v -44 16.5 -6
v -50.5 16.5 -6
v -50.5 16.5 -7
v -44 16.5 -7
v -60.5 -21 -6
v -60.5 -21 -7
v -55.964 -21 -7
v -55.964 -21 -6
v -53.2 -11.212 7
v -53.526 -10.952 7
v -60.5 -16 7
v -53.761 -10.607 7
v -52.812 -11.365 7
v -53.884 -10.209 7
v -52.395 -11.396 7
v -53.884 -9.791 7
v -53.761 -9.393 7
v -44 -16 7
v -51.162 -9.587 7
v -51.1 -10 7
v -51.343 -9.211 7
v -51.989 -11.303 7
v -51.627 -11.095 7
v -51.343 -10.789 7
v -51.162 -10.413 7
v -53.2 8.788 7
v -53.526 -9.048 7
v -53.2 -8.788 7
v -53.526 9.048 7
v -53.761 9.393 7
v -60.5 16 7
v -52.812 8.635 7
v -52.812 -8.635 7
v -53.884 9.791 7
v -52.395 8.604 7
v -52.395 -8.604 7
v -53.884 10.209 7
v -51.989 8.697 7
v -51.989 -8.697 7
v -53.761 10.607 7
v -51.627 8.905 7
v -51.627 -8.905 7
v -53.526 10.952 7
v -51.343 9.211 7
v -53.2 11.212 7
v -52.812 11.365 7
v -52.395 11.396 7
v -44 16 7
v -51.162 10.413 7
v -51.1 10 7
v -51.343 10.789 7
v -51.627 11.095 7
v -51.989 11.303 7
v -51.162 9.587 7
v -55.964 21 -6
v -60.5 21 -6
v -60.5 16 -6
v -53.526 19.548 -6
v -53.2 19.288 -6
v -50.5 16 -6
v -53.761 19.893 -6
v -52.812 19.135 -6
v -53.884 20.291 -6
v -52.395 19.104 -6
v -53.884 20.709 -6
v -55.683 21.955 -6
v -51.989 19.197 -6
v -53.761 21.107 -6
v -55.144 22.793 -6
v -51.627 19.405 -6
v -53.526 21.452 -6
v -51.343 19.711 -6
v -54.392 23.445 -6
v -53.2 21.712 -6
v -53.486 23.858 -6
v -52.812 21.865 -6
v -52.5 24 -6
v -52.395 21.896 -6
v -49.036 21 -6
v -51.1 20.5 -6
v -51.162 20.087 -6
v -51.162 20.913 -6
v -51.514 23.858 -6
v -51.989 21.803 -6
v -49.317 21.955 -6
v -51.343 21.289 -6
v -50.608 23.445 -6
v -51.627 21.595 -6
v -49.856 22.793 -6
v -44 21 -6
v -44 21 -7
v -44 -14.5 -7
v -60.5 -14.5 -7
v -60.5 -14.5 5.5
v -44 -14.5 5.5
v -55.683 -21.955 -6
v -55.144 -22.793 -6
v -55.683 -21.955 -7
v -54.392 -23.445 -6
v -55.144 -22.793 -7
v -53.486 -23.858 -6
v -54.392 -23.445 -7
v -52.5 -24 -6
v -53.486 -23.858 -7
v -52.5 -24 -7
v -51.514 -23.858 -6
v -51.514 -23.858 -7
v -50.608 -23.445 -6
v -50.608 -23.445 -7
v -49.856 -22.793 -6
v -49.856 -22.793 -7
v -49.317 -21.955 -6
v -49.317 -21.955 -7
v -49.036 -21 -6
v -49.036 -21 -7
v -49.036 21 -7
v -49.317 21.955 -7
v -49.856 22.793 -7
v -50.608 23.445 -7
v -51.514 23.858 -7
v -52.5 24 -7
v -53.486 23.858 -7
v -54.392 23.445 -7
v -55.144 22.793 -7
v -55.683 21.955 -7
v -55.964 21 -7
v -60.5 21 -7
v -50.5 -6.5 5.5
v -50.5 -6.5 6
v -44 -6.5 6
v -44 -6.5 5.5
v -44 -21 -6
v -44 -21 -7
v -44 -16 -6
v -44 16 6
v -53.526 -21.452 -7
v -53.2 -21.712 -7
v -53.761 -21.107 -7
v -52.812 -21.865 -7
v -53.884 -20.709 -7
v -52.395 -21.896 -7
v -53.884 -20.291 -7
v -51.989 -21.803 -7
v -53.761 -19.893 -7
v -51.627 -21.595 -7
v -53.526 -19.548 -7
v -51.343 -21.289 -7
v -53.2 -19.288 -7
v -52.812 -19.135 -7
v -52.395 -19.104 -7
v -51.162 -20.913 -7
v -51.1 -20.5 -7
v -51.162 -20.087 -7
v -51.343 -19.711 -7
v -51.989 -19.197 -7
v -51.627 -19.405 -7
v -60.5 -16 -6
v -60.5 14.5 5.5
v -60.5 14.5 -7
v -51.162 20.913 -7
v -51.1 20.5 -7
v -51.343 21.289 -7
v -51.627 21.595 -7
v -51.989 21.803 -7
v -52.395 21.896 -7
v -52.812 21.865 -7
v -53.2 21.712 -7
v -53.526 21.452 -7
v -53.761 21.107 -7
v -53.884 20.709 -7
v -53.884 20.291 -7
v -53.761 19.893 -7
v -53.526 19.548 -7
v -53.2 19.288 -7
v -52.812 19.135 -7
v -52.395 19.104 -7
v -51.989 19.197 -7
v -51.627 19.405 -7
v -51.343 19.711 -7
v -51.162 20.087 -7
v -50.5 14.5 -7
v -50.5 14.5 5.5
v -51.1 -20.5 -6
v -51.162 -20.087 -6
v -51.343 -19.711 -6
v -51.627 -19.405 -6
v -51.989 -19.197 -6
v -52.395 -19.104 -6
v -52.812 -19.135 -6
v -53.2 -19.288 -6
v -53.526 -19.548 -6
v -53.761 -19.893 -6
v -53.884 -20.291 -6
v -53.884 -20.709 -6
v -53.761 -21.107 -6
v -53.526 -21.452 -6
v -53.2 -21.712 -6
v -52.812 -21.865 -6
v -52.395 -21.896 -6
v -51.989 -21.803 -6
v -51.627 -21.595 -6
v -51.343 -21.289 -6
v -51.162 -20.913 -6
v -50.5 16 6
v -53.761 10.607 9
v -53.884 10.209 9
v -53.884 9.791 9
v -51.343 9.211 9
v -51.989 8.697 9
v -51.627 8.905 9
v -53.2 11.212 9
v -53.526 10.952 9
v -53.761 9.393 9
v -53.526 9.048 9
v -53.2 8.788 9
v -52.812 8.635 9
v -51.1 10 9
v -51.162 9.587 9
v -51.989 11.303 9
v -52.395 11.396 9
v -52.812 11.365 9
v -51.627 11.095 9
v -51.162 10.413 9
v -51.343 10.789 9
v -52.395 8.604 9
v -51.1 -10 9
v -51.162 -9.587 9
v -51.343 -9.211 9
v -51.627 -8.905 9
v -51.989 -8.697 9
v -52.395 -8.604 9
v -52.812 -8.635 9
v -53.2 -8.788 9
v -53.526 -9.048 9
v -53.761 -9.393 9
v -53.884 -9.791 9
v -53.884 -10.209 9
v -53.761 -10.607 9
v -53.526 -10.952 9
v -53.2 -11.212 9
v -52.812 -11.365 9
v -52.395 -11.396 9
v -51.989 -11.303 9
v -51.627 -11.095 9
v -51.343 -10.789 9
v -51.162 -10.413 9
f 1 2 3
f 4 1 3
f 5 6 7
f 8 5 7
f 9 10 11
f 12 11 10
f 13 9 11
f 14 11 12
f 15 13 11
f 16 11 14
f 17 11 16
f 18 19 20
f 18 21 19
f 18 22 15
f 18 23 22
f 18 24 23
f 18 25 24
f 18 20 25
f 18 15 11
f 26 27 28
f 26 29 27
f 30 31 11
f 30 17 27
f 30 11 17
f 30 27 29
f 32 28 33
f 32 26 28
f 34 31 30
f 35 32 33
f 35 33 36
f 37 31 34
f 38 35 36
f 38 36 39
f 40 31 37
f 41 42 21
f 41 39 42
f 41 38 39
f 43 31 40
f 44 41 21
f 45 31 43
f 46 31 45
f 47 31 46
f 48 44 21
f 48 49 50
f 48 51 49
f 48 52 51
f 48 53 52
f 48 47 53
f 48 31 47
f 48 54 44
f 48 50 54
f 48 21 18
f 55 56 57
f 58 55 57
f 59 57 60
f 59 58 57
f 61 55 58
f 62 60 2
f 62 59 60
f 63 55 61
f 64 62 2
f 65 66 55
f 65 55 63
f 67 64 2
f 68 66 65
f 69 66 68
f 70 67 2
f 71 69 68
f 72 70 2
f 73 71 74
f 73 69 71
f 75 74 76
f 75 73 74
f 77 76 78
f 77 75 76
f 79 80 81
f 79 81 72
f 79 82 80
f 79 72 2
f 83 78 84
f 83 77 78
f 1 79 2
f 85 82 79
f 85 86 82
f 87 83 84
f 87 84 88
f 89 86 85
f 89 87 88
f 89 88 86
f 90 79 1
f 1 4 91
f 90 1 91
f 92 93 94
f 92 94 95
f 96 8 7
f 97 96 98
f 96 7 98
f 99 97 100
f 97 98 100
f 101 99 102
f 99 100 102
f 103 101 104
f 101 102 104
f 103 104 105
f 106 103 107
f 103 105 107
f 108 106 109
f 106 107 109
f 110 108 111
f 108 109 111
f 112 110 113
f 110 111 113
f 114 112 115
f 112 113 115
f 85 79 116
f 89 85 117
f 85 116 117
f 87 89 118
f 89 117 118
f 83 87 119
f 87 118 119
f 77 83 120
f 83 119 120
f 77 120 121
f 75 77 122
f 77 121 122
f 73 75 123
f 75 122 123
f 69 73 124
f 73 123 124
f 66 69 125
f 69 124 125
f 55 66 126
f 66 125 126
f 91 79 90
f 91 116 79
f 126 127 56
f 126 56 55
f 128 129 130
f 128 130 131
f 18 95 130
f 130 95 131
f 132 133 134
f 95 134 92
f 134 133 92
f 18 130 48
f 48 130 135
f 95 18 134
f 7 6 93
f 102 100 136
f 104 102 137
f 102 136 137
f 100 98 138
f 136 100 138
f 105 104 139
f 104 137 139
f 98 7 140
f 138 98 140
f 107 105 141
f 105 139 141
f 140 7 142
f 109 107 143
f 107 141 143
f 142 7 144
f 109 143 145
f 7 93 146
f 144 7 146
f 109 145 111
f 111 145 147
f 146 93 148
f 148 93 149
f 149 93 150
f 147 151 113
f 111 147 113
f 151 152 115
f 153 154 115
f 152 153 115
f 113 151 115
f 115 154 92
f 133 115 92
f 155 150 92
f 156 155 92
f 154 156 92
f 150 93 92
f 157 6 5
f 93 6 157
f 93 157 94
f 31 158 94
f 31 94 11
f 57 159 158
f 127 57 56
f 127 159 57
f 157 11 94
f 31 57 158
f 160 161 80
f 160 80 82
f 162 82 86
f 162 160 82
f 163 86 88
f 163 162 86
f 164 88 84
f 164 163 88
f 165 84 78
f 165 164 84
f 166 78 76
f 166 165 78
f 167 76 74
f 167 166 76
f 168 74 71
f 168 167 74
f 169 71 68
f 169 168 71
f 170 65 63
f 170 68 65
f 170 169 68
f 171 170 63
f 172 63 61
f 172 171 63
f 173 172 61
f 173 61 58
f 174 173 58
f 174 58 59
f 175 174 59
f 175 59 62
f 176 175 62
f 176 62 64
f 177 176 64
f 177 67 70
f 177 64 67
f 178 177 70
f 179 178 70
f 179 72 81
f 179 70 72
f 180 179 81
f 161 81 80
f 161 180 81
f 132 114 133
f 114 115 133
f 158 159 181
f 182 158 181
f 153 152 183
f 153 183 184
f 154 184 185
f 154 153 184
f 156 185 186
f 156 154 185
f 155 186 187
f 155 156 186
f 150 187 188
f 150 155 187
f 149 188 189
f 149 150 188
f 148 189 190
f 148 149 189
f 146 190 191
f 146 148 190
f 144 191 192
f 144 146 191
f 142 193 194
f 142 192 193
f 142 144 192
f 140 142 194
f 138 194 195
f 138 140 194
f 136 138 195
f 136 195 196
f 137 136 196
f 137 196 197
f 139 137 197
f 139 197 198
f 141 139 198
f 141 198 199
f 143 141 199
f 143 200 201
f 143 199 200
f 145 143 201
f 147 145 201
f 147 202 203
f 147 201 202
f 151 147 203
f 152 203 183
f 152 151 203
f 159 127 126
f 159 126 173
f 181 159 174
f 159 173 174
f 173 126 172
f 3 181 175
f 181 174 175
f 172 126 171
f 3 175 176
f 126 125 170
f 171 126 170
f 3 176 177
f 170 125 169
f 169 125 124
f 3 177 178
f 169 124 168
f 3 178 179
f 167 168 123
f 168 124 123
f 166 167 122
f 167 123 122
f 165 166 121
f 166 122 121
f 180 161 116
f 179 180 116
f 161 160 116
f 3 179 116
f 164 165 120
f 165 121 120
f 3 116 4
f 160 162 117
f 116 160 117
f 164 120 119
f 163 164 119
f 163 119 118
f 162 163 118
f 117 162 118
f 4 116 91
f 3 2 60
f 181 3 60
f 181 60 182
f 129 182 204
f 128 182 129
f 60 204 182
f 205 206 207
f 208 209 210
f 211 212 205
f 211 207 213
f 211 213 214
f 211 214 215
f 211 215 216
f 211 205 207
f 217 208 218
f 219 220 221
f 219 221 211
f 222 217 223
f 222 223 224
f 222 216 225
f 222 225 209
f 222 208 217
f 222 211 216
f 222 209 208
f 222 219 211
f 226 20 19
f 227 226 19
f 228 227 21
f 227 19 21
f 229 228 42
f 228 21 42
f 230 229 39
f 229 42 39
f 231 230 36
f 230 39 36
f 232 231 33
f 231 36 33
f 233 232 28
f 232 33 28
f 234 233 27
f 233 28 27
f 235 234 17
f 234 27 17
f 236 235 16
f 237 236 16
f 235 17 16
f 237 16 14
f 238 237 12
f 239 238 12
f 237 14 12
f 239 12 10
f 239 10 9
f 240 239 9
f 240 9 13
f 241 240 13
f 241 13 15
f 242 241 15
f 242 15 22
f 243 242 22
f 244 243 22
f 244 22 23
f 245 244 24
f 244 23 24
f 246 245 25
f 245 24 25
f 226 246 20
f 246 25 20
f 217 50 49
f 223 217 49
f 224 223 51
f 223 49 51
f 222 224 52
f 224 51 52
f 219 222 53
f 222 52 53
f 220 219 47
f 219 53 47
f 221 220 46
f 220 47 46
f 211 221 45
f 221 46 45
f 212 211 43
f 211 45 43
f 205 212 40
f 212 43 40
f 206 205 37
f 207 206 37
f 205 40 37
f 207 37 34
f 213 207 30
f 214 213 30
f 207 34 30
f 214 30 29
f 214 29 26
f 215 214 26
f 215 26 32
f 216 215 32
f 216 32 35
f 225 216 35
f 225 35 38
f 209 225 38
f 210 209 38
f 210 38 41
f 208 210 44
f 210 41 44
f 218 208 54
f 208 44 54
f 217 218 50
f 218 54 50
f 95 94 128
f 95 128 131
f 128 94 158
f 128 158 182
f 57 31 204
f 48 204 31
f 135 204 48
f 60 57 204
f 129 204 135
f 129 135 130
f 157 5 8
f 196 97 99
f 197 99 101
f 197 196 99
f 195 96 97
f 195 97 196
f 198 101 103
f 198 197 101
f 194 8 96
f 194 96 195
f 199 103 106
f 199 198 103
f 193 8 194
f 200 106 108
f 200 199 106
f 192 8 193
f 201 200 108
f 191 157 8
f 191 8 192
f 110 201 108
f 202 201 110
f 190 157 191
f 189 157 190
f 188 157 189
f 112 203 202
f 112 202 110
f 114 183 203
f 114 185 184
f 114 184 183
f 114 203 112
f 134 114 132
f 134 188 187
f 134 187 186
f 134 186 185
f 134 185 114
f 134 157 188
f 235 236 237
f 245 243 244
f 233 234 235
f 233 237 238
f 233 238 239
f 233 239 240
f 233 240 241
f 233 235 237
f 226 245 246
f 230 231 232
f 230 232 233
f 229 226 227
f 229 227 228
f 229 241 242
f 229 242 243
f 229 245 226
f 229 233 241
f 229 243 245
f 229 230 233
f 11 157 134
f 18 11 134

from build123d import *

# Parameters (mm, degrees)
CYLINDER100_R          = 1.5
CYLINDER100_DEPTH      = 10
CYLINDER103_R          = 1.5
CYLINDER103_DEPTH      = 5
CYLINDER104_R          = 1.5
CYLINDER104_DEPTH      = 10
CYLINDER102_R          = 3.5
CYLINDER102_DEPTH      = 5
BOX064_W               = 32
BOX064_H               = 13
BOX064_DEPTH           = 2
CYLINDER101_R          = 6.5
CYLINDER101_DEPTH      = 6
BOX063_W               = 23
BOX063_H               = 13
BOX063_DEPTH           = 24
CUT044_ROLL_ANGLE      = -90
CUT044_PLACEMENT_ANGLE = -90
CYLINDER086_R          = 1.4
CYLINDER086_DEPTH      = 4
BOX043_W               = 18
BOX043_H               = 29
BOX043_DEPTH           = 12.5
BOX044_W               = 18
BOX044_H               = 6
BOX044_DEPTH           = 17
BOX045_W               = 18
BOX045_H               = 6
BOX045_DEPTH           = 17
CYLINDER085_R          = 1.4
CYLINDER085_DEPTH      = 4
CYLINDER084_R          = 3.5
CYLINDER084_DEPTH      = 1
BOX042_W               = 16.5
BOX042_H               = 42
BOX042_DEPTH           = 14
CYLINDER021_R          = 1.4
CYLINDER021_DEPTH      = 2
CYLINDER022_R          = 1.4
CYLINDER022_DEPTH      = 2
BOX010_W               = 16
BOX010_H               = 32
BOX010_DEPTH           = 1
CYLINDER083_R          = 3.5
CYLINDER083_DEPTH      = 1


with BuildPart() as zylinder100:
    # Cylinder100 → Cylinder100 (new body)
    with BuildSketch(Plane(origin=(25.5, 6.5, 13), x_dir=(1, 0, 0), z_dir=(0, 0, 1))):
        Circle(CYLINDER100_R)
    extrude(amount=CYLINDER100_DEPTH)


with BuildPart() as zylinder103:
    # Cylinder103 → Cylinder103 (new body)
    with BuildSketch(Plane(origin=(16.5, 6.5, 30), x_dir=(1, 0, 0), z_dir=(0, 0, 1))):
        Circle(CYLINDER103_R)
    extrude(amount=CYLINDER103_DEPTH)


with BuildPart() as fusion061:
    # Cylinder104 → Cylinder104 (new body)
    with BuildSketch(Plane(origin=(-2.5, 6.5, 13), x_dir=(1, 0, 0), z_dir=(0, 0, 1))):
        Circle(CYLINDER104_R)
    extrude(amount=CYLINDER104_DEPTH)

    # Fusion061: union Zylinder100, Zylinder103
    add(zylinder100.part)
    add(zylinder103.part)


with BuildPart() as zylinder102:
    # Cylinder102 → Cylinder102 (new body)
    with BuildSketch(Plane(origin=(16.5, 6.5, 29), x_dir=(1, 0, 0), z_dir=(0, 0, 1))):
        Circle(CYLINDER102_R)
    extrude(amount=CYLINDER102_DEPTH)


with BuildPart() as w_rfel064:
    # Box064 → Box064 (new body)
    with BuildSketch(Plane(origin=(-4.5, 0, 18), x_dir=(1, 0, 0), z_dir=(0, 0, 1))):
        with Locations((16, 6.5)):
            Rectangle(BOX064_W, BOX064_H)
    extrude(amount=BOX064_DEPTH)


with BuildPart() as zylinder101:
    # Cylinder101 → Cylinder101 (new body)
    with BuildSketch(Plane(origin=(16.5, 6.5, 23), x_dir=(1, 0, 0), z_dir=(0, 0, 1))):
        Circle(CYLINDER101_R)
    extrude(amount=CYLINDER101_DEPTH)


with BuildPart() as servo3_mask001:
    # Box063 → Box063 (new body)
    with BuildSketch(Plane.XY.offset(-1)):
        with Locations((11.5, 6.5)):
            Rectangle(BOX063_W, BOX063_H)
    extrude(amount=BOX063_DEPTH)

    # Fusion060: union Zylinder102, Würfel064, Zylinder101
    add(zylinder102.part)
    add(w_rfel064.part)
    add(zylinder101.part)

    # Cut044: cut Fusion061
    add(fusion061.part, mode=Mode.SUBTRACT)


with BuildPart() as servo3_mask001_1:
    # Cut044 roll: moved
    add(servo3_mask001.part.rotate(Axis((0, 0, 0), (1, 0, 0)), CUT044_ROLL_ANGLE))


with BuildPart() as servo3_mask001_2:
    # Cut044 placement: moved
    add(servo3_mask001_1.part.moved(Location((-49.5, 16.5, 5))).rotate(Axis((-49.5, 16.5, 5), (0, 0, 1)), CUT044_PLACEMENT_ANGLE))


with BuildPart() as zylinder086:
    # Cylinder086 → Cylinder086 (new body)
    with BuildSketch(Plane(origin=(-52.5, 20.5, -9.5), x_dir=(1, 0, 0), z_dir=(0, 0, 1))):
        Circle(CYLINDER086_R)
    extrude(amount=CYLINDER086_DEPTH)


with BuildPart() as w_rfel043:
    # Box043 → Box043 (new body)
    with BuildSketch(Plane(origin=(-61.5, -14.5, -8), x_dir=(1, 0, 0), z_dir=(0, 0, 1))):
        with Locations((9, 14.5)):
            Rectangle(BOX043_W, BOX043_H)
    extrude(amount=BOX043_DEPTH)


with BuildPart() as w_rfel044:
    # Box044 → Box044 (new body)
    with BuildSketch(Plane(origin=(-61.5, -22, -7), x_dir=(1, 0, 0), z_dir=(0, 0, 1))):
        with Locations((9, 3)):
            Rectangle(BOX044_W, BOX044_H)
    extrude(amount=BOX044_DEPTH)


with BuildPart() as w_rfel045:
    # Box045 → Box045 (new body)
    with BuildSketch(Plane(origin=(-61.5, 16, -7), x_dir=(1, 0, 0), z_dir=(0, 0, 1))):
        with Locations((9, 3)):
            Rectangle(BOX045_W, BOX045_H)
    extrude(amount=BOX045_DEPTH)


with BuildPart() as fusion093:
    # Cylinder085 → Cylinder085 (new body)
    with BuildSketch(Plane(origin=(-52.5, -20.5, -9.5), x_dir=(1, 0, 0), z_dir=(0, 0, 1))):
        Circle(CYLINDER085_R)
    extrude(amount=CYLINDER085_DEPTH)

    # Fusion047: union Zylinder086, Würfel043, Würfel044, Würfel045
    add(zylinder086.part)
    add(w_rfel043.part)
    add(w_rfel044.part)
    add(w_rfel045.part)

    # Fusion093: union Servo3_mask001
    add(servo3_mask001_2.part)


with BuildPart() as zylinder084:
    # Cylinder084 → Cylinder084 (new body)
    with BuildSketch(Plane(origin=(-52.5, 20.5, -8), x_dir=(1, 0, 0), z_dir=(0, 0, 1))):
        Circle(CYLINDER084_R)
    extrude(amount=CYLINDER084_DEPTH)


with BuildPart() as w_rfel042:
    # Box042 → Box042 (new body)
    with BuildSketch(Plane(origin=(-60.5, -21, -8), x_dir=(1, 0, 0), z_dir=(0, 0, 1))):
        with Locations((8.25, 21)):
            Rectangle(BOX042_W, BOX042_H)
    extrude(amount=BOX042_DEPTH)


with BuildPart() as zylinder021:
    # Cylinder021 → Cylinder021 (new body)
    with BuildSketch(Plane(origin=(16.5, 10, -26.5), x_dir=(1, 0, 0), z_dir=(0, 0, 1))):
        Circle(CYLINDER021_R)
    extrude(amount=CYLINDER021_DEPTH)


with BuildPart() as zylinder022:
    # Cylinder022 → Cylinder022 (new body)
    with BuildSketch(Plane(origin=(16.5, -10, -26.5), x_dir=(1, 0, 0), z_dir=(0, 0, 1))):
        Circle(CYLINDER022_R)
    extrude(amount=CYLINDER022_DEPTH)


with BuildPart() as fusion009:
    # Box010 → Box010 (new body)
    with BuildSketch(Plane(origin=(8.5, -16, -27.5), x_dir=(1, 0, 0), z_dir=(0, 0, 1))):
        with Locations((8, 16)):
            Rectangle(BOX010_W, BOX010_H)
    extrude(amount=BOX010_DEPTH)

    # Fusion009: union Zylinder021, Zylinder022
    add(zylinder021.part)
    add(zylinder022.part)


with BuildPart() as fusion009_1:
    # Fusion009 placement: moved
    add(fusion009.part.moved(Location((-69, 0, 32.5))))


with BuildPart() as cut082:
    # Cylinder083 → Cylinder083 (new body)
    with BuildSketch(Plane(origin=(-52.5, -20.5, -8), x_dir=(1, 0, 0), z_dir=(0, 0, 1))):
        Circle(CYLINDER083_R)
    extrude(amount=CYLINDER083_DEPTH)

    # Fusion046: union Zylinder084, Würfel042, Fusion009
    add(zylinder084.part)
    add(w_rfel042.part)
    add(fusion009_1.part)

    # Cut082: cut Fusion093
    add(fusion093.part, mode=Mode.SUBTRACT)


with BuildPart() as cut082_1:
    # Cut082 placement: moved
    add(cut082.part.moved(Location((0, 0, 1))))


solid = cut082_1.part
